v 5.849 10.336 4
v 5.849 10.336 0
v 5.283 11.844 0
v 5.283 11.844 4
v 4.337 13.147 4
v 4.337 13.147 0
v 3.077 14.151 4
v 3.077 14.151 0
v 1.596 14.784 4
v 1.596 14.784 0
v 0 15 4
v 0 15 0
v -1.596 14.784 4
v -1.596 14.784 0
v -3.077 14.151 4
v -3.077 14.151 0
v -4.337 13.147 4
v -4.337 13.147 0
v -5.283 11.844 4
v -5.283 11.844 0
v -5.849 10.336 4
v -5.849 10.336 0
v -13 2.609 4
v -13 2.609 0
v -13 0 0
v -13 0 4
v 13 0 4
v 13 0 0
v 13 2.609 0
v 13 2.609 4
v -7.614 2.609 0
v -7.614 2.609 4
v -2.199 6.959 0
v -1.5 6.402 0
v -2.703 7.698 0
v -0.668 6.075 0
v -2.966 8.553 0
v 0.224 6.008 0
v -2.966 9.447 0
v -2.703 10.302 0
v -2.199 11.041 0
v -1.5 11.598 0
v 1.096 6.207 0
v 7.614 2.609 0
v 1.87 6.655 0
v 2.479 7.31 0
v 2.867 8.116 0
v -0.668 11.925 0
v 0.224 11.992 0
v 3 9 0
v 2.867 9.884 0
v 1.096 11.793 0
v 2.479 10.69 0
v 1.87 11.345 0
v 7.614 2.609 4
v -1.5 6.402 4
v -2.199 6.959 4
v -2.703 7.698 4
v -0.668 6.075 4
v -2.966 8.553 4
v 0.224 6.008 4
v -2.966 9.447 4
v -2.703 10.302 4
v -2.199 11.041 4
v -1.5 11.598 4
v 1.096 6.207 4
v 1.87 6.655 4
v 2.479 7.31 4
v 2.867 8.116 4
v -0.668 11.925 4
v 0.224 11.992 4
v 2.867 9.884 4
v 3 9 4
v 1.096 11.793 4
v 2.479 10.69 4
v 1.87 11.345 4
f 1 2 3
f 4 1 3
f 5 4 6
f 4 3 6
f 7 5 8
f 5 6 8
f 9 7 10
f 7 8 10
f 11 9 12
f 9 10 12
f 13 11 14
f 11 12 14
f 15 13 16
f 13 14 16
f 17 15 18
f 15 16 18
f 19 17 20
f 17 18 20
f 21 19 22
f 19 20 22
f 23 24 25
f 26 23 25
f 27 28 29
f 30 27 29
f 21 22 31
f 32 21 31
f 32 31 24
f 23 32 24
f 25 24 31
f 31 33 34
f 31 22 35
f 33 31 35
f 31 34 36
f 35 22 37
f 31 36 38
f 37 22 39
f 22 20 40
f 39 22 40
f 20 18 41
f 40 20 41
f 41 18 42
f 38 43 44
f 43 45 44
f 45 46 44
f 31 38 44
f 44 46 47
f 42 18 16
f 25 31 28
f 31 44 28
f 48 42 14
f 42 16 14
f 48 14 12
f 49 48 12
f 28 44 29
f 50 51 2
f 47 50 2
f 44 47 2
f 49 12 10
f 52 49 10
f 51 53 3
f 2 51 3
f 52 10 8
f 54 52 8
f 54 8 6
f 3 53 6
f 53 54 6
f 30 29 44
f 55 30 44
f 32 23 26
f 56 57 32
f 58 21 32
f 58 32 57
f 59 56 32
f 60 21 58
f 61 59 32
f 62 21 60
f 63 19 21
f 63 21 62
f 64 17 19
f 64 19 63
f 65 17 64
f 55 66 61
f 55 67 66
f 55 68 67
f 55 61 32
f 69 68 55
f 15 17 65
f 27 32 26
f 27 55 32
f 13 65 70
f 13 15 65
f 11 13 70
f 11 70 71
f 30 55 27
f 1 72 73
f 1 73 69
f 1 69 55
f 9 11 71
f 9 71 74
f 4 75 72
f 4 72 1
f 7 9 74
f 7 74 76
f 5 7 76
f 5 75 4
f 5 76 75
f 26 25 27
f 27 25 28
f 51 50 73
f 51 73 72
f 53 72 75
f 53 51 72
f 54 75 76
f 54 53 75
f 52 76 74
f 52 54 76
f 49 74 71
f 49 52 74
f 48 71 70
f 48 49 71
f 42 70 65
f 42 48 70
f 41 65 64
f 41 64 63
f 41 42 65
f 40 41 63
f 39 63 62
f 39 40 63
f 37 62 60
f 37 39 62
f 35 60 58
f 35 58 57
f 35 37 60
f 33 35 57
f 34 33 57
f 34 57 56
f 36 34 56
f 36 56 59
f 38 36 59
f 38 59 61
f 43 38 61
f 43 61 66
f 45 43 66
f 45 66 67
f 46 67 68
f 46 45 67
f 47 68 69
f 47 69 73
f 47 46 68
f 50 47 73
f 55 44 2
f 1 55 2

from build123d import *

# Parameters (mm, degrees)
ESBO_O1_R                = 3
RESSALTO_EXTRUS_O1_DEPTH = 4


with BuildPart() as part:
    # Esboço1 → Ressalto-extrusão1 (new body)
    with BuildSketch(Plane.XY):
        with BuildLine():
            Line((-8.209602621, 0), (8.209602621, 0))
            Line((8.209602621, 0), (13, 0))
            Line((13, 0), (13, 2.609213558))
            Line((13, 2.609213558), (7.613786386, 2.609213558))
            Line((7.613786386, 2.609213558), (5.849431135, 10.335722798))
            ThreePointArc((5.849431135, 10.335722798), (0, 15), (-5.849431135, 10.335722798))
            Line((-5.849431135, 10.335722798), (-7.613786386, 2.609213558))
            Line((-7.613786386, 2.609213558), (-13, 2.609213558))
            Line((-13, 2.609213558), (-13, 0))
            Line((-13, 0), (-8.209602621, 0))
        make_face()
        with Locations((0, 9)):
            Circle(ESBO_O1_R, mode=Mode.SUBTRACT)
    extrude(amount=RESSALTO_EXTRUS_O1_DEPTH)


solid = part.part
